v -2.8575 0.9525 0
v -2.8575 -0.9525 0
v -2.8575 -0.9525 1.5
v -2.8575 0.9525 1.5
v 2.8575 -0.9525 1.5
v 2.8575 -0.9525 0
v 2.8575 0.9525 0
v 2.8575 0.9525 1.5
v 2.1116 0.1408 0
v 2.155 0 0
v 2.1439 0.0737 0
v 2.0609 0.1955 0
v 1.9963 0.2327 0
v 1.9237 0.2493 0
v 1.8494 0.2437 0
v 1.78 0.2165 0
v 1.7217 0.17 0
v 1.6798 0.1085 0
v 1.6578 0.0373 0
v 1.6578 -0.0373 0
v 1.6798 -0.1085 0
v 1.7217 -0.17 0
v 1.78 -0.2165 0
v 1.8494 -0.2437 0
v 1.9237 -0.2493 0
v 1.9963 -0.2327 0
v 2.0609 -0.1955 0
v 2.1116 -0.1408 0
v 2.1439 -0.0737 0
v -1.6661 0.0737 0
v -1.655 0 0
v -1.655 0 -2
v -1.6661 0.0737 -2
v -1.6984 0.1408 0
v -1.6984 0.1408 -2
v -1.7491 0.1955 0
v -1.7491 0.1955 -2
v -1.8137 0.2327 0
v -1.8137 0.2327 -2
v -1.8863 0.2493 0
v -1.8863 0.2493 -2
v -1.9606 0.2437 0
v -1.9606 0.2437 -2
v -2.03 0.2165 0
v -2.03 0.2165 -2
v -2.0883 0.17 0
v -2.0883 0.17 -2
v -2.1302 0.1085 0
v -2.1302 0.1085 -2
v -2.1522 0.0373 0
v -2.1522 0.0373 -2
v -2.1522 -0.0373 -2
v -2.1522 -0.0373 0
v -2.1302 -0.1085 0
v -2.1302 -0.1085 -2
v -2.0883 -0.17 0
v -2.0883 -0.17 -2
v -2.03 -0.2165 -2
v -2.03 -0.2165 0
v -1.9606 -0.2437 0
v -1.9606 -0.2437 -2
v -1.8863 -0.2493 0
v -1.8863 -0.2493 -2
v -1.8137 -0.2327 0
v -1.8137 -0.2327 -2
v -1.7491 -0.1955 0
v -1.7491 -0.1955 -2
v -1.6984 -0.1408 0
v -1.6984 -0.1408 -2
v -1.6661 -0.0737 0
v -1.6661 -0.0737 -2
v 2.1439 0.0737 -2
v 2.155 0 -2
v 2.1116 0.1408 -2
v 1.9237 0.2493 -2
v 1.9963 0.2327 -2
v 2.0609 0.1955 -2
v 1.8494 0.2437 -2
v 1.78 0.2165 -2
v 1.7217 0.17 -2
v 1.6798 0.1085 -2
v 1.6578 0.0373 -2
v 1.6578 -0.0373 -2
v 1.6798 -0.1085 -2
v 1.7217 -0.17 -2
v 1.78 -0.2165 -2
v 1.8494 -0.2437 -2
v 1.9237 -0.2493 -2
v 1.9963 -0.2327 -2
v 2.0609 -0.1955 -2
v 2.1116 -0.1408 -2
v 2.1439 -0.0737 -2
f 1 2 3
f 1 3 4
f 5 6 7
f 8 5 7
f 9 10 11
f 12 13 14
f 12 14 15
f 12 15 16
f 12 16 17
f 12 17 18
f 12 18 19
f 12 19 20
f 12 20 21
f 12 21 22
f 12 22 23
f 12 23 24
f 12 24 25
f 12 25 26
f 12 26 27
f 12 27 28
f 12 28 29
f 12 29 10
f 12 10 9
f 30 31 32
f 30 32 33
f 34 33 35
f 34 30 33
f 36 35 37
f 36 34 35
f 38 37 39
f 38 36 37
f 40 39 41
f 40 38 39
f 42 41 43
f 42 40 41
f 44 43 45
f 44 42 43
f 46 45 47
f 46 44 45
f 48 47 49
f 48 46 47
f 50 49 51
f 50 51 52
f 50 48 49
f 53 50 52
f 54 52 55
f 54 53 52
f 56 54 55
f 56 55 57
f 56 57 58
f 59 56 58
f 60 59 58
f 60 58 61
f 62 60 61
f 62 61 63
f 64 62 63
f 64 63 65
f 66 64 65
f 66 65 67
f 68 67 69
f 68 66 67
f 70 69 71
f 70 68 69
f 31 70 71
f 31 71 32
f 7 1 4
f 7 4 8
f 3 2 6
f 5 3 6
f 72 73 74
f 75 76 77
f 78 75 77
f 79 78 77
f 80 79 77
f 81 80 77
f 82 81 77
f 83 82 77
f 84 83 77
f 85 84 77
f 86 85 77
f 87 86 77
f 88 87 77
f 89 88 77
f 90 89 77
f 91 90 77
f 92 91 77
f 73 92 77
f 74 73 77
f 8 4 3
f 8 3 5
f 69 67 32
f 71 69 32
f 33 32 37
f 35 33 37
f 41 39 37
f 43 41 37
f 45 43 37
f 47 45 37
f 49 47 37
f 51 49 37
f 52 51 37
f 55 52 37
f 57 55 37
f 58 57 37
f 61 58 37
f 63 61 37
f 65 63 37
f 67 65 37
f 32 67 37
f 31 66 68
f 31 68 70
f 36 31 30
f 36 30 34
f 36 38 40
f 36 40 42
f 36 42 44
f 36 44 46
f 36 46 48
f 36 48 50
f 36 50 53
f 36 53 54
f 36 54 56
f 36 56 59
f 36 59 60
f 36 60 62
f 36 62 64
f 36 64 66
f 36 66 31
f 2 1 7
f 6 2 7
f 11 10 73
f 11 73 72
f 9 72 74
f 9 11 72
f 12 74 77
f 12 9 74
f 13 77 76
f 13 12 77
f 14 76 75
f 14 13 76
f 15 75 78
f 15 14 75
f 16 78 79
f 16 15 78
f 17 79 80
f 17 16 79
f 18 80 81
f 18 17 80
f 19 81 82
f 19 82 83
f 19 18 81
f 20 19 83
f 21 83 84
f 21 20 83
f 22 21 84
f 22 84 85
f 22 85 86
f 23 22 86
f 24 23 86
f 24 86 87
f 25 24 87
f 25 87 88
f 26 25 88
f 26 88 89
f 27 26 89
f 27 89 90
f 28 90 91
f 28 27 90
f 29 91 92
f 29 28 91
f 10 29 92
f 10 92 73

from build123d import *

# Parameters (mm, degrees)
SKETCH1_W               = 5.715
SKETCH1_H               = 1.905
COMPONENT_OUTLINE_DEPTH = 1.5
SKETCH2_R               = 0.25
EXTRUDE_1_DEPTH         = 2
SKETCH3_R               = 0.25
EXTRUDE_2_DEPTH         = 2


with BuildPart() as part:
    # Sketch1 → Component_Outline (new body)
    with BuildSketch(Plane.XY):
        Rectangle(SKETCH1_W, SKETCH1_H)
    extrude(amount=COMPONENT_OUTLINE_DEPTH)


with BuildPart() as body_2:
    # Sketch2 → Extrude 1 (new body)
    with BuildSketch(Plane.XY):
        with Locations((-1.905, 0)):
            Circle(SKETCH2_R)
    extrude(amount=-EXTRUDE_1_DEPTH)


with BuildPart() as body_3:
    # Sketch3 → Extrude 2 (new body)
    with BuildSketch(Plane.XY):
        with Locations((1.905, 0)):
            Circle(SKETCH3_R)
    extrude(amount=-EXTRUDE_2_DEPTH)


solid = Compound([part.part, body_2.part, body_3.part])
